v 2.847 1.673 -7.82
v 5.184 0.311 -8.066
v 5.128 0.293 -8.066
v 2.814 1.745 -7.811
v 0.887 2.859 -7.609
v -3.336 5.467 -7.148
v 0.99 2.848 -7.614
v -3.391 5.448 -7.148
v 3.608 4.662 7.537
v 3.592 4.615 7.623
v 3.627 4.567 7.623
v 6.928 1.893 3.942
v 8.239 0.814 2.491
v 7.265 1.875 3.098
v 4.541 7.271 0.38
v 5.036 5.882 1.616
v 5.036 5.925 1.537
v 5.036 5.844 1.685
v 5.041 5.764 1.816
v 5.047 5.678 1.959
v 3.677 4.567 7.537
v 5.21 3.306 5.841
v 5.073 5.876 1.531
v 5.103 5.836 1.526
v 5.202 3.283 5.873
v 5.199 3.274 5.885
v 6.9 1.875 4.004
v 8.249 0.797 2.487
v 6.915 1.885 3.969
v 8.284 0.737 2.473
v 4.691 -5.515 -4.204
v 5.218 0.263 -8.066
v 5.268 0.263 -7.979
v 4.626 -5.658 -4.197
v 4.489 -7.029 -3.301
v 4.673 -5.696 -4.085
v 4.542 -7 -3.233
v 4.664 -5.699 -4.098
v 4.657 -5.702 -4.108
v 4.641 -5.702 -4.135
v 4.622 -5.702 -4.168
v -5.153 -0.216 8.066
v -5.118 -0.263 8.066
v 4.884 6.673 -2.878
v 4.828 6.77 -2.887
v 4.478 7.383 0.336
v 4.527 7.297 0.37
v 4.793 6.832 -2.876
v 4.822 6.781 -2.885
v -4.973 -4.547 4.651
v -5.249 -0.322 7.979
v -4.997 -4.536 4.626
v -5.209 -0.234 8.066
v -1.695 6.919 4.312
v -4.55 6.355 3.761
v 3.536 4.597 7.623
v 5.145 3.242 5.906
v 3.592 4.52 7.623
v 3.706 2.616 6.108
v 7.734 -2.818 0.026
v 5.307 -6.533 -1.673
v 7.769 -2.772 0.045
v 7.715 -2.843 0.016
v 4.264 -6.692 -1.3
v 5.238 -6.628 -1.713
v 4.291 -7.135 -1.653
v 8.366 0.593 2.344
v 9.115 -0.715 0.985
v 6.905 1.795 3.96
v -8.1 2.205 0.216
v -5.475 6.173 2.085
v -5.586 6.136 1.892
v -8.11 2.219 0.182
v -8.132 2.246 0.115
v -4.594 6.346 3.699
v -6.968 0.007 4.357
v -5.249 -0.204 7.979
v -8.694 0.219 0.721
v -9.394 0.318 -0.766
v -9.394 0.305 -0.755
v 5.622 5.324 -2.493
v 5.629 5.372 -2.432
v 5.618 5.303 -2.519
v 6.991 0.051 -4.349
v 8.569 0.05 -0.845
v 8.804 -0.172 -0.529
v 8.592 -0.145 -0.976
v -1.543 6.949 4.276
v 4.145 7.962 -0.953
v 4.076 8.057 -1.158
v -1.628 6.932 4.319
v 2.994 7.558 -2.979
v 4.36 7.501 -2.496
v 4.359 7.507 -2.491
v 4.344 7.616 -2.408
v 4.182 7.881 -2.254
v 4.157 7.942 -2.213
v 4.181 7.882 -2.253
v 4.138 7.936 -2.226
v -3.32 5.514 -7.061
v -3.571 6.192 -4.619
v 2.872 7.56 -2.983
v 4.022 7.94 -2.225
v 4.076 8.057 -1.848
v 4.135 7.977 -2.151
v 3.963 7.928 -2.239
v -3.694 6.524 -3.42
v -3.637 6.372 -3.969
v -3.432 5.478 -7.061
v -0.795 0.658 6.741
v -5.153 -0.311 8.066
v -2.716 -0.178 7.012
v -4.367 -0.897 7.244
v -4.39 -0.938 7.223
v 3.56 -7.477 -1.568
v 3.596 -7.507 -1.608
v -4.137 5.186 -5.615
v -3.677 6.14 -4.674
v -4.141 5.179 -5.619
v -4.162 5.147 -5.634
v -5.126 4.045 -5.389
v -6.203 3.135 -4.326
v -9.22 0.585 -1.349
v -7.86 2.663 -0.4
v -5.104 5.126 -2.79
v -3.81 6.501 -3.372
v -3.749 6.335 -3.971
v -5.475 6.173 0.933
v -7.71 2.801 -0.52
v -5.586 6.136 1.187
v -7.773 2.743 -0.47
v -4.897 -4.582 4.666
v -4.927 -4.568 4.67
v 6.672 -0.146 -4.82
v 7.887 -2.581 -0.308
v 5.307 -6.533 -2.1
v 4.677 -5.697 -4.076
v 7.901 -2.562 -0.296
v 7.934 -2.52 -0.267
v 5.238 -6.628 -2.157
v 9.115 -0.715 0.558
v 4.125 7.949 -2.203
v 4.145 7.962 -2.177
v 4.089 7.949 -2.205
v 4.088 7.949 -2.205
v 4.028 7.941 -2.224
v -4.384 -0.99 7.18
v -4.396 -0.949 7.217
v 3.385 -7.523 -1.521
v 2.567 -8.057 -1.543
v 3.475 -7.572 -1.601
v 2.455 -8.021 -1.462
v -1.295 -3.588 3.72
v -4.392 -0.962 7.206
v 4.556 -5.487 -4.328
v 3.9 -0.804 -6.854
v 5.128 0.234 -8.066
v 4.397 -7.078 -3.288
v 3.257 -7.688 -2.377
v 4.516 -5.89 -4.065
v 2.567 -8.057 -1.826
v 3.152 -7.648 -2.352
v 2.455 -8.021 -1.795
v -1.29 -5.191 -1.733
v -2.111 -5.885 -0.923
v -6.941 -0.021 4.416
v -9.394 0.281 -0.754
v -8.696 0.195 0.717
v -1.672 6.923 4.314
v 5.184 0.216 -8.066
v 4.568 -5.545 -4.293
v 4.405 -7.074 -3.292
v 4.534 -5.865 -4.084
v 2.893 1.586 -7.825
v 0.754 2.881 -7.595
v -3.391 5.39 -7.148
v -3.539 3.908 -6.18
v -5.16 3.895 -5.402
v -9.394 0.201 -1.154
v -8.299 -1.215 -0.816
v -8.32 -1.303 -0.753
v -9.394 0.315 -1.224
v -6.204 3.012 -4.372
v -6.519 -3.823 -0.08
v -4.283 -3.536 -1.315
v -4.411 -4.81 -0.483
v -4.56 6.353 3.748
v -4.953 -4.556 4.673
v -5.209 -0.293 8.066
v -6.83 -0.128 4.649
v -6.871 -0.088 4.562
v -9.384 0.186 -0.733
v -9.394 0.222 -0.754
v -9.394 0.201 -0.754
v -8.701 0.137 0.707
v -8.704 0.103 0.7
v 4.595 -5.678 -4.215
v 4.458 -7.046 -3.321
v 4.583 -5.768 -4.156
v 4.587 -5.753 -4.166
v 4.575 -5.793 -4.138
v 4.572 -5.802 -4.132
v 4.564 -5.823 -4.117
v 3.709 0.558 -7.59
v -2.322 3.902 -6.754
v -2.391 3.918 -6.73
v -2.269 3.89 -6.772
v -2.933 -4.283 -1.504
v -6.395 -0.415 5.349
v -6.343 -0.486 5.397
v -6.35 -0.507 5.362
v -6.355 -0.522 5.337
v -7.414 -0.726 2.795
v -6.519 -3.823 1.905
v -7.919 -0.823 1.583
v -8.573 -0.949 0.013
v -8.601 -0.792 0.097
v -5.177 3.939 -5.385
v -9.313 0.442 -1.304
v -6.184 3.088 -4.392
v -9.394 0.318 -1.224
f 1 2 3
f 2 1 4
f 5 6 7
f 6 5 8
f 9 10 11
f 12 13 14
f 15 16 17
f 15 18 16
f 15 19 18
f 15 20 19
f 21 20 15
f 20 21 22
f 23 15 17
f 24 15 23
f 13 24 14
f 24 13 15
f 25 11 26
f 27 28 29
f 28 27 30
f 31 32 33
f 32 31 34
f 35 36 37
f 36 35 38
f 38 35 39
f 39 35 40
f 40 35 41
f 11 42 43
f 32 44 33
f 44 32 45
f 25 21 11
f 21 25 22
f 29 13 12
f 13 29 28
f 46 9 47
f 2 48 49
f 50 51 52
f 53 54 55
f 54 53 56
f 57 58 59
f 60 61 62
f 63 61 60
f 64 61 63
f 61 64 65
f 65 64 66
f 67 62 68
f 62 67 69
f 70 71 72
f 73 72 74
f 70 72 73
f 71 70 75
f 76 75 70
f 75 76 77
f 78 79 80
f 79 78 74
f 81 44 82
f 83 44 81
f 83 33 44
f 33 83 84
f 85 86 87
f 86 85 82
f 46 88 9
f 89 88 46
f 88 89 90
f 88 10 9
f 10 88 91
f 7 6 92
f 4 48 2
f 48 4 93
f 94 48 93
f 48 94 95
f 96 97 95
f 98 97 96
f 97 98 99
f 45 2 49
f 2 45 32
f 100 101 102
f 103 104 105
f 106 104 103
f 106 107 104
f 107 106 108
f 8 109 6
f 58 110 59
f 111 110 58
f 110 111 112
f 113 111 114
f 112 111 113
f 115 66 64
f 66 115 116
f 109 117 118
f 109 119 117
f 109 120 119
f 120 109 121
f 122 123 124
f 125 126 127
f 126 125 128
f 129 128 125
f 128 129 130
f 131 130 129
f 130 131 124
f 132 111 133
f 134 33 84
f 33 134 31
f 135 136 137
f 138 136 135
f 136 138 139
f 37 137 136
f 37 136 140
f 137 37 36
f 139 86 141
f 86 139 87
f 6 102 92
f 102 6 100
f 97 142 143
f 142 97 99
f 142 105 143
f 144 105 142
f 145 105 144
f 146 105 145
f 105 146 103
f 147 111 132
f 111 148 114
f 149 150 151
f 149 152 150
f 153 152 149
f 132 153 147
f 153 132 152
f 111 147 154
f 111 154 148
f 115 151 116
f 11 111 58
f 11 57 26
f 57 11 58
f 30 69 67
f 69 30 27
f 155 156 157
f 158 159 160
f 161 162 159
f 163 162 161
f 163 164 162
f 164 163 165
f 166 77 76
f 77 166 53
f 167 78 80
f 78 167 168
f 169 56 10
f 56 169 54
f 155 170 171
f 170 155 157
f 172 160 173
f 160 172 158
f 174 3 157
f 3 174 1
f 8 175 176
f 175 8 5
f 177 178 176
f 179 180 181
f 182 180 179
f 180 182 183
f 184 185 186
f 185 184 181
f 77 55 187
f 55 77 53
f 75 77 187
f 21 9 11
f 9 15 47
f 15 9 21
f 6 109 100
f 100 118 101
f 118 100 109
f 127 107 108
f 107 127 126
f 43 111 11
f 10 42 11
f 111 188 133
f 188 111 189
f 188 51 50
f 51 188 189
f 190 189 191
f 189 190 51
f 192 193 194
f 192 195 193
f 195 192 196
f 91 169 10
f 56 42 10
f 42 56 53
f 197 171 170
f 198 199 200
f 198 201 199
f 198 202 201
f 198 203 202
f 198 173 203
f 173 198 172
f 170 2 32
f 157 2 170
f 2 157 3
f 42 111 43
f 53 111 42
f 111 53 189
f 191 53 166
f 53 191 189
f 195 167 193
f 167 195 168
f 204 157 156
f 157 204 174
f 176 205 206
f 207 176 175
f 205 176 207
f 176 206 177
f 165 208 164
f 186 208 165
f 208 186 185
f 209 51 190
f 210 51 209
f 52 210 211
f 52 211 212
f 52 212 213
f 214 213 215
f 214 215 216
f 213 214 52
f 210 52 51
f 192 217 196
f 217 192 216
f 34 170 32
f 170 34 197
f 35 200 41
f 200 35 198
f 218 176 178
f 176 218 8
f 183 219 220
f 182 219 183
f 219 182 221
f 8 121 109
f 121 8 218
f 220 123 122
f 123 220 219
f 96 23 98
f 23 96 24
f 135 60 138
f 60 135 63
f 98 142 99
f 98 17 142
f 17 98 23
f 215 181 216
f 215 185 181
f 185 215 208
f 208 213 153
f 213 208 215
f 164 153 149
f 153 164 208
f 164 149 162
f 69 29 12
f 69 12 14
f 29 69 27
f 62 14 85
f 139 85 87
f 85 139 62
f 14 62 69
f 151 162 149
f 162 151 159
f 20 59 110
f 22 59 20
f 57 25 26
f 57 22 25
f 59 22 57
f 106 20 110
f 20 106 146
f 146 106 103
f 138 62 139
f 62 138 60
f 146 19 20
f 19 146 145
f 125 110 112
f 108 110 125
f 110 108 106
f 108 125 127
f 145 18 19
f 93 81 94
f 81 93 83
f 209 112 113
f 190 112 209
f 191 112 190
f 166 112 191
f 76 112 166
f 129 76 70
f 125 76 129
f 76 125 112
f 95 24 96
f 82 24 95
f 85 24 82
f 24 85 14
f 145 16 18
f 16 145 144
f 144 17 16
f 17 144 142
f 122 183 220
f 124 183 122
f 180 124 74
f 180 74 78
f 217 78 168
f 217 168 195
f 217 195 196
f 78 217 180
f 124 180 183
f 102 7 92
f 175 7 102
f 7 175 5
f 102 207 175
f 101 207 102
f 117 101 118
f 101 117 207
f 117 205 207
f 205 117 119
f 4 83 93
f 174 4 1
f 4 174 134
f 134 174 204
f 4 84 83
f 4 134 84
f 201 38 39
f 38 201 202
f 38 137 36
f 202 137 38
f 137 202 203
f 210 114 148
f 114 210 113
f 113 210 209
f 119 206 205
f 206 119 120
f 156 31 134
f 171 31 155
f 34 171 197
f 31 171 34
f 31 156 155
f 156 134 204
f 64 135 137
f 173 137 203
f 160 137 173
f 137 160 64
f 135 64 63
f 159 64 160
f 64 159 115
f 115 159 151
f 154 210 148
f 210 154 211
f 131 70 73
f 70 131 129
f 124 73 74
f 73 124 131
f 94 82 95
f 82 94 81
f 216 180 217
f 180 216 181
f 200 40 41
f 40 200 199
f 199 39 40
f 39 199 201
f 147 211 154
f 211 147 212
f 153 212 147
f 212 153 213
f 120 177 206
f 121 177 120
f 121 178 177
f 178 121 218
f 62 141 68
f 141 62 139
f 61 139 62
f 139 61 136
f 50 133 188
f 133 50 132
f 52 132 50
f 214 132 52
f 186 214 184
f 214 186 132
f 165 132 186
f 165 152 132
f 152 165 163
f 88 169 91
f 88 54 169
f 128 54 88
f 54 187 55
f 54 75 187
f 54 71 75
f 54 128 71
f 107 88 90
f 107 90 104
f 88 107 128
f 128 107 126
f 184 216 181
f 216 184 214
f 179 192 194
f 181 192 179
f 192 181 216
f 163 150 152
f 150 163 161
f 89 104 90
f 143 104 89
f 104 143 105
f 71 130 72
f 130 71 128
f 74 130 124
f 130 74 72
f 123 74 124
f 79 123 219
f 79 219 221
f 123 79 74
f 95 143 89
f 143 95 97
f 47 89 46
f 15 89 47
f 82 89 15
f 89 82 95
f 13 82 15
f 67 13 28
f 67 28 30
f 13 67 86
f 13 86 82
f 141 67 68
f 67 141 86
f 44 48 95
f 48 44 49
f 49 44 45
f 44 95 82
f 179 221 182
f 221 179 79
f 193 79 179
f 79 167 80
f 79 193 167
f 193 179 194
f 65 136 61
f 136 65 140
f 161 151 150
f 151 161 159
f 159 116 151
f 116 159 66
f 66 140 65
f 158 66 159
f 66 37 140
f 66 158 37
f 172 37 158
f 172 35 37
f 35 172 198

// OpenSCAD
// Auto-generated OpenSCAD file

    inner_points = 10*[[-0.9313235840465552, 0.025941713534936496, 0.24961039887898973], [0.18176070420337553, 0.09962140742080969, -0.9224171855702517], [-0.21156256215452457, -0.14515796252296415, 0.9224171855702517], [0.9015217260954063, -0.07147826863709097, -0.24961039887898973], [-0.6438494477287671, -0.3764461593931605, -0.6195516232254873], [-0.5505502074210448, 0.607754695616786, -0.46907262550257495], [0.5207483494698958, -0.6532912507189405, 0.46907262550257495], [0.6140475897776181, 0.330909604291006, 0.6195516232254873], [0.2535803612941774, -0.7962352175813989, -0.48391650792537955], [0.4045417032366162, 0.7962352175814017, -0.24043637501668932]];

    outer_points = 10*[[-0.46997284627252917, -0.8078951994968868, 0.17589589984947596], [-0.43345305778897786, 0.8078951994968868, 0.25284835477167783], [0.43345305778897786, -0.8078951994968868, -0.25284835477167783], [0.46997284627252917, 0.8078951994968868, -0.17589589984947596], [-0.9449617853062939, 0.026321601166102375, -0.10422521197036727], [-0.5168120337823261, -0.026321601166102375, 0.7979479884286332], [0.5168120337823261, 0.026321601166102375, -0.7979479884286332], [0.9449617853062939, -0.026321601166102375, 0.10422521197036727], [-0.3350951898479052, 0.5418959379620255, -0.7060938346625941], [0.3576656603926969, 0.45671744731188046, 0.753653067322259]];

    // Convex hull for inner set (I)
    module inner_hull() {
        hull() {
            for (p = inner_points) {
                translate(p) sphere(r=0.1);
            }
        }
    }

    // Convex hull for outer set (O) minus inner hull (O \ I)
    module outer_minus_inner() {
        difference() {
            hull() {
                for (p = outer_points) {
                    translate(p) sphere(r=0.1);
                }
            }
            inner_hull(); // Subtract inner hull
        }
    }

    // Convex hull for outer set (O) minus all translated inner hulls
    module outer_minus_AllTranslationInner() {
        difference() {
            hull() {
                for (p = outer_points) {
                    translate(p) sphere(r=0.1);
                }
            }
            hull() {
                translate([0,0,50]) inner_hull();
                translate([0,0,-50]) inner_hull();
            }; // Subtract translated inner hulls
        }
    }

    // Difference between outer_minus_inner and outer_minus_AllTranslationInner
    module outer_minus_inner_diff() {
        difference() {
            // Outer minus inner
            difference() {
                hull() {
                    for (p = outer_points) {
                        translate(p) sphere(r=0.1);
                    }
                }
                inner_hull();
            }

            // Subtract Outer minus AllTranslationInner
            difference() {
                hull() {
                    for (p = outer_points) {
                        translate(p) sphere(r=0.1);
                    }
                }
                hull() {
                    translate([0,0,50]) inner_hull();
                    translate([0,0,-50]) inner_hull();
                };
            }
        }
    }

    // Rendering all with colors applied
    color([1, 1, 0, 1]) outer_minus_inner_diff(); // Opaque yellow
    
